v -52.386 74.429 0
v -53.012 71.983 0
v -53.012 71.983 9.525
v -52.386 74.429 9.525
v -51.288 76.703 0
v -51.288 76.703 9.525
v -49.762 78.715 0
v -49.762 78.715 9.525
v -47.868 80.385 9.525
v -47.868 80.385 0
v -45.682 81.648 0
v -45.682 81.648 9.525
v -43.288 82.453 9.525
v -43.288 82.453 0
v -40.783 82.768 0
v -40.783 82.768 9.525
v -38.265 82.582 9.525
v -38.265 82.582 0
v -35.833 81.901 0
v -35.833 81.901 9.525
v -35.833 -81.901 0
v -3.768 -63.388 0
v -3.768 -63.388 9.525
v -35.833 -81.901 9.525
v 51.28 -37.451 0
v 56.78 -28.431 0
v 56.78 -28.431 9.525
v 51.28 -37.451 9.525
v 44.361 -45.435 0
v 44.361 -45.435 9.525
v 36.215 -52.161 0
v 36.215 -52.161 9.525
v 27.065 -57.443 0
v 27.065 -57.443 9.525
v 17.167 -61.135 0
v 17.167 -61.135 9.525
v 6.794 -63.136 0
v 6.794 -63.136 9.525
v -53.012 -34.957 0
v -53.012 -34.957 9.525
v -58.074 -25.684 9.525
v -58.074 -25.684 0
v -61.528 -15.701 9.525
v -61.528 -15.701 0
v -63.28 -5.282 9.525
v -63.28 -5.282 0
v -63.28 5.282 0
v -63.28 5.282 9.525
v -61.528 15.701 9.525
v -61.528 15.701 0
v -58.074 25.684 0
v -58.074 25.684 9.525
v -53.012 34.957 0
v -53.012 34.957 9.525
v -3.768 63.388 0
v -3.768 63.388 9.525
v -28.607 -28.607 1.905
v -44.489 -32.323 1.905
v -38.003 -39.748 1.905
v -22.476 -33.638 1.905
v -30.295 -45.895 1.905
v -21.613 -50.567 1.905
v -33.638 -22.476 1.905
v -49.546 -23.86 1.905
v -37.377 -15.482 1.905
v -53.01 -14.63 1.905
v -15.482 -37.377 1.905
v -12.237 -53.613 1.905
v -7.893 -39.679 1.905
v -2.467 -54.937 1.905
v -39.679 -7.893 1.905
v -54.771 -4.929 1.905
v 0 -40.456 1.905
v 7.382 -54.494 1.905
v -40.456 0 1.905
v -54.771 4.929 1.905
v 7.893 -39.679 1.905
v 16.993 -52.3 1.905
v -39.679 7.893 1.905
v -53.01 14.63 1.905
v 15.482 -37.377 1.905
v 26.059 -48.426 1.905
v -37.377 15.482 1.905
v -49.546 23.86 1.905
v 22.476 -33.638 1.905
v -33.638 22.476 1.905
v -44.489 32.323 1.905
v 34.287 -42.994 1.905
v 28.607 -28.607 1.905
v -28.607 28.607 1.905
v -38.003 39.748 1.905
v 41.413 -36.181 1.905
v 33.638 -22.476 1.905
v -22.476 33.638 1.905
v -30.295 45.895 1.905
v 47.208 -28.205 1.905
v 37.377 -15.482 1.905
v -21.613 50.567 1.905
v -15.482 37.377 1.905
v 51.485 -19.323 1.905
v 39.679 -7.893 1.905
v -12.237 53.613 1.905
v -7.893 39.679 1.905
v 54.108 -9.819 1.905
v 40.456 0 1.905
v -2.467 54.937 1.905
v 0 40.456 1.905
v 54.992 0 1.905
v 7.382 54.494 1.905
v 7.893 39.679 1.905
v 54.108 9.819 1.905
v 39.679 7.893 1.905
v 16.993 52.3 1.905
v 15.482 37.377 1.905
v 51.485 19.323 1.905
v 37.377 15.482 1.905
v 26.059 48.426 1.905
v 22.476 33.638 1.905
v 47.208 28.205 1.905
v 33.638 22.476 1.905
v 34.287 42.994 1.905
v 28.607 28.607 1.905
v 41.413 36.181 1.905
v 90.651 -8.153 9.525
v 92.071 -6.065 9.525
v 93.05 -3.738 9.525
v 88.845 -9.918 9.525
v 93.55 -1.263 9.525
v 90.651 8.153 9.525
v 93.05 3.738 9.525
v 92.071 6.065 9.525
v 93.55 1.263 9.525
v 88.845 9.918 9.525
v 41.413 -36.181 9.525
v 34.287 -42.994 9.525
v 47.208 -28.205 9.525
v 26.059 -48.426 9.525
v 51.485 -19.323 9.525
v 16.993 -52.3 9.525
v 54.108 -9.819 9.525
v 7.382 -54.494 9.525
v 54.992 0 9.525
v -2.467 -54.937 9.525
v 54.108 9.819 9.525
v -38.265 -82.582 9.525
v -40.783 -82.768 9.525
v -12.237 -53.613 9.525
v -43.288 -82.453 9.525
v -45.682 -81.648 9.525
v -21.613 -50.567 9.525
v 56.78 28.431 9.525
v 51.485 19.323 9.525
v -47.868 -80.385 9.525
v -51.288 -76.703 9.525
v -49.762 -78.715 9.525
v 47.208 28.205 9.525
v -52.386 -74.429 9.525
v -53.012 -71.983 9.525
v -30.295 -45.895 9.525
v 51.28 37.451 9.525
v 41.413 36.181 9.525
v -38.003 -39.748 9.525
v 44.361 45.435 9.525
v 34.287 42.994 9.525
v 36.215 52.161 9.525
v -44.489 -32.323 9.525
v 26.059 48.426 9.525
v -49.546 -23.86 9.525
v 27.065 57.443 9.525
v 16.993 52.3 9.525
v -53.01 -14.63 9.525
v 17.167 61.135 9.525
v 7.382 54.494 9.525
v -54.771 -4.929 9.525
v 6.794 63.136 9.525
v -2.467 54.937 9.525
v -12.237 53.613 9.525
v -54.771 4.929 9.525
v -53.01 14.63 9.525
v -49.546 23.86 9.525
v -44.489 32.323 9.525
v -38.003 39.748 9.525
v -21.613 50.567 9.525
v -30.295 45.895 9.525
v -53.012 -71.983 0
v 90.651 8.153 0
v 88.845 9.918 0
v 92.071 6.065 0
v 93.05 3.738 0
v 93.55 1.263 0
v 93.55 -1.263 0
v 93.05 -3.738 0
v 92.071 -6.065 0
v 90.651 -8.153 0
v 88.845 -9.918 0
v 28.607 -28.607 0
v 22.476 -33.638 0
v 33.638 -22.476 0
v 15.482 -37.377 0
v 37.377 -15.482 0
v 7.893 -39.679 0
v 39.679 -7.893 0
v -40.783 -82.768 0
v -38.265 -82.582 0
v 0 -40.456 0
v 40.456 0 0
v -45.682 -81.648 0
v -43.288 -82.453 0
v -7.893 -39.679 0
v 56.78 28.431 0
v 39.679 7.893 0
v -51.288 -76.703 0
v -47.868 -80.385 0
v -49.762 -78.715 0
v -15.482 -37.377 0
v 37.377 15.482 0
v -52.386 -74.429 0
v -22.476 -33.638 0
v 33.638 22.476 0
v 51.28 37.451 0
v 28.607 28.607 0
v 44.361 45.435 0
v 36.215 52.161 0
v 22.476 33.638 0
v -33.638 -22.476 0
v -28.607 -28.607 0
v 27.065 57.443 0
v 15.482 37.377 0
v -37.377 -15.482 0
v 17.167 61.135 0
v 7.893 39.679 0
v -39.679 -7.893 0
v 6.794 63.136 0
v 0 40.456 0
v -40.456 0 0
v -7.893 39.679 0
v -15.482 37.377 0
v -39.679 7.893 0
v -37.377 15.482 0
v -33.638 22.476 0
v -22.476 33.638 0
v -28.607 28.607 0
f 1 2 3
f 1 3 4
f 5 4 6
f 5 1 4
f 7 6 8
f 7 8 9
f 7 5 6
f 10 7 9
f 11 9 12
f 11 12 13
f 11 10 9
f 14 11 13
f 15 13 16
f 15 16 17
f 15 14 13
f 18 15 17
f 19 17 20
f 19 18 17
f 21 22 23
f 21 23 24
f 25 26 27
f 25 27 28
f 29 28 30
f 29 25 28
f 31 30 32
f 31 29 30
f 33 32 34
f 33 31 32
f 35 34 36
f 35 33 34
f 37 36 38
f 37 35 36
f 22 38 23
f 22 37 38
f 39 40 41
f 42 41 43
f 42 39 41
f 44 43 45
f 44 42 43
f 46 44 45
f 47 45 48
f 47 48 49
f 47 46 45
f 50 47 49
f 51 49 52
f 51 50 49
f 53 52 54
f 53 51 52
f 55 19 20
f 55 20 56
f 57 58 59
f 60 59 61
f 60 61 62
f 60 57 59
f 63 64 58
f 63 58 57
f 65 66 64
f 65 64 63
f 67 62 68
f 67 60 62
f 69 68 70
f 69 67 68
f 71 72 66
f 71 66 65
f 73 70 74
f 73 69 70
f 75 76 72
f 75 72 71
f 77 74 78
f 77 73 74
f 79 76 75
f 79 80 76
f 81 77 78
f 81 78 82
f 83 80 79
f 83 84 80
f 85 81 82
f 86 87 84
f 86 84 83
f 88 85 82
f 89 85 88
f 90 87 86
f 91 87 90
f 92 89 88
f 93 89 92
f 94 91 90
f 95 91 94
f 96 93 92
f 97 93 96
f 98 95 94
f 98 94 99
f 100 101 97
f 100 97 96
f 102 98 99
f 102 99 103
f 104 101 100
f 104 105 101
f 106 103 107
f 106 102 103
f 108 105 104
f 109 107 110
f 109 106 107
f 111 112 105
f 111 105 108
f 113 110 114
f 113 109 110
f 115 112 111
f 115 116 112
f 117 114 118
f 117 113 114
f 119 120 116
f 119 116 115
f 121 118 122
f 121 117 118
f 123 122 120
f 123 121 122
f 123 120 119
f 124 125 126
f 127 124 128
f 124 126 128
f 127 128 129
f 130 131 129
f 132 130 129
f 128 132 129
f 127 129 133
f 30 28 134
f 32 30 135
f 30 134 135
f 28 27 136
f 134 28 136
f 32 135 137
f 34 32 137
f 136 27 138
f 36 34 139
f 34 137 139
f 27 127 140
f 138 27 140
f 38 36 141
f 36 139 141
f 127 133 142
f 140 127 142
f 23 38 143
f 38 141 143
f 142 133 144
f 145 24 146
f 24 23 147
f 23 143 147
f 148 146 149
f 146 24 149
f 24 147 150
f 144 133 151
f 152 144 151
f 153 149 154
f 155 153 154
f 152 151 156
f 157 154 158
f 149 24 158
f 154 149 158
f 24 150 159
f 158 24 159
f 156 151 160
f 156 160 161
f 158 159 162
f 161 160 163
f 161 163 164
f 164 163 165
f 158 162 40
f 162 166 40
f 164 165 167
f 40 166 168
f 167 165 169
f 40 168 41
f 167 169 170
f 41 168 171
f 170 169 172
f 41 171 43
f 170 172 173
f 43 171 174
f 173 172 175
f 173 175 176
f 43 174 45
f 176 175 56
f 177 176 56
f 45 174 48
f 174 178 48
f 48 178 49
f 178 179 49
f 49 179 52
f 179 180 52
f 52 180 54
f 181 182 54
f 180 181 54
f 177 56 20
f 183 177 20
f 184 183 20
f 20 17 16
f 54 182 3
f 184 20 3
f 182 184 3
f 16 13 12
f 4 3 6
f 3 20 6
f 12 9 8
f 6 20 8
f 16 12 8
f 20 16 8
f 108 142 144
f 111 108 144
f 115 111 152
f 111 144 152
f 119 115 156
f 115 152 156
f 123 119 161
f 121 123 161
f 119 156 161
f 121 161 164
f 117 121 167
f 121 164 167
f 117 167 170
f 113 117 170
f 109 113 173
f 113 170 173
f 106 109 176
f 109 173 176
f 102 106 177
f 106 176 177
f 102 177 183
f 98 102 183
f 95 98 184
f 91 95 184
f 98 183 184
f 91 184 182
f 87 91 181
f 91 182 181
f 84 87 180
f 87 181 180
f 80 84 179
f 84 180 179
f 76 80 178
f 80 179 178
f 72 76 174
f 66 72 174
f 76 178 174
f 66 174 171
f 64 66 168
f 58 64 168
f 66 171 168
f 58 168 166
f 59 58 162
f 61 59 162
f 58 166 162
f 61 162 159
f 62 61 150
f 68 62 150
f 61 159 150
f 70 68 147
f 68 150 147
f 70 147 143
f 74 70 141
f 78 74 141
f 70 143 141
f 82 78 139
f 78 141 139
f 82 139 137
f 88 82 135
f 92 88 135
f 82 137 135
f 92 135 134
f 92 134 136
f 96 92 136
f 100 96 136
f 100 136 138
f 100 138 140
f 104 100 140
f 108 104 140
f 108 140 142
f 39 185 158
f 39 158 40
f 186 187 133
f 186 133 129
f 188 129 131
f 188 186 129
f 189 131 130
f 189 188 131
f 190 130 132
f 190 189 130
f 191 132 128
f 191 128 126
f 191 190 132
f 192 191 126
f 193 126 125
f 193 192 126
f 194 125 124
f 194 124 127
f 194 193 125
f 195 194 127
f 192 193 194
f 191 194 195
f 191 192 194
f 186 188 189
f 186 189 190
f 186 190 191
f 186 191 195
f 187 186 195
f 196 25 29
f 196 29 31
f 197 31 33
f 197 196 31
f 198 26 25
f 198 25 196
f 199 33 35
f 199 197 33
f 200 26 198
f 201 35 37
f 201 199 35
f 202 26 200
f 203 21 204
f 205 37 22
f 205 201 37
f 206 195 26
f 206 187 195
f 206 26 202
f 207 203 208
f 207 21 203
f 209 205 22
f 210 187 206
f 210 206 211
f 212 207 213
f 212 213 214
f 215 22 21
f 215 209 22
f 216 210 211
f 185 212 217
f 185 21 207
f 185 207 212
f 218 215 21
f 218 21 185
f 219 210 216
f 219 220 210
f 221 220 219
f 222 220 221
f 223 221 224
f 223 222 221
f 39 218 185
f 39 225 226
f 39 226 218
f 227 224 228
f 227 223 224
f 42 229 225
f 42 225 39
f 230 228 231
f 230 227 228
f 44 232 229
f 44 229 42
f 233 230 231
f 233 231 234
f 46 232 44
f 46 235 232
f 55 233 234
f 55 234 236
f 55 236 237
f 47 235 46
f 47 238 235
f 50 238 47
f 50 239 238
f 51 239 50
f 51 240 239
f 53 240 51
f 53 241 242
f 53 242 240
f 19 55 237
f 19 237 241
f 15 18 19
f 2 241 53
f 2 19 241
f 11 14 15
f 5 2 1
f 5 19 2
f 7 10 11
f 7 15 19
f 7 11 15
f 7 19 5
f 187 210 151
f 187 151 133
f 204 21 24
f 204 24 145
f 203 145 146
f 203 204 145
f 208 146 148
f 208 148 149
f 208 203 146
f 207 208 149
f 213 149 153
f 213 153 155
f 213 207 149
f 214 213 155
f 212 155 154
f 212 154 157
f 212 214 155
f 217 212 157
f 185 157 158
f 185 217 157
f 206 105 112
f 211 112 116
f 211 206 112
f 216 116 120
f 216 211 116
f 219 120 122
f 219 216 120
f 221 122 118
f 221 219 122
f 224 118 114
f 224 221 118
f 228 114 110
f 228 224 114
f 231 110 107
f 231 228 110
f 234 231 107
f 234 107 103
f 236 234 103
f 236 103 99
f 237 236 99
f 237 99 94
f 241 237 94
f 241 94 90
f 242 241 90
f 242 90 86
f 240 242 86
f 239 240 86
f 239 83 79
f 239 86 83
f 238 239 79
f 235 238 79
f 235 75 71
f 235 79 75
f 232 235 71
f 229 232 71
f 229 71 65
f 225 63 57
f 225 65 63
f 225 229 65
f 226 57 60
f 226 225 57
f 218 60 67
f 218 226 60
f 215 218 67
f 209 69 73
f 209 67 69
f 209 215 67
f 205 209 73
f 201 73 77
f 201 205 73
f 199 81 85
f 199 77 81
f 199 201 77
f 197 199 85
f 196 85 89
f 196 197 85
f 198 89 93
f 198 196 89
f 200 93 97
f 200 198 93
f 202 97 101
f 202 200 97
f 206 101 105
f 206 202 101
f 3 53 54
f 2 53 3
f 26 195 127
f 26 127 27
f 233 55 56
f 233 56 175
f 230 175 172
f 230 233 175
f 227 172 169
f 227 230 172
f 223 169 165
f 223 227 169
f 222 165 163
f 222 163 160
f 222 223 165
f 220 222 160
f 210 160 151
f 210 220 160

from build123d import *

# Parameters (mm, degrees)
SKETCH1_R          = 40.456394747
BASE_EXTRUDE_DEPTH = 9.525
SKETCH2_R          = 54.991944722
CUT_EXTRUDE1_DEPTH = 7.62


with BuildPart() as part:
    # Sketch1 → Base-Extrude (new body)
    with BuildSketch(Plane.XY):
        with BuildLine():
            Line((88.84522521, -9.917986872), (56.779605871, -28.43108083))
            ThreePointArc((56.779605871, -28.43108083), (31.75, -54.99261314), (-3.76776468, -63.388121516))
            Line((-3.76776468, -63.388121516), (-35.833384019, -81.901215473))
            ThreePointArc((-35.833384019, -81.901215473), (-46.806394747, -81.07105382), (-53.011841191, -71.983228601))
            Line((-53.011841191, -71.983228601), (-53.011841191, -34.957040686))
            ThreePointArc((-53.011841191, -34.957040686), (-63.5, 0), (-53.011841191, 34.957040686))
            Line((-53.011841191, 34.957040686), (-53.011841191, 71.983228601))
            ThreePointArc((-53.011841191, 71.983228601), (-46.806394747, 81.07105382), (-35.833384019, 81.901215473))
            Line((-35.833384019, 81.901215473), (-3.76776468, 63.388121516))
            ThreePointArc((-3.76776468, 63.388121516), (31.75, 54.99261314), (56.779605871, 28.43108083))
            Line((56.779605871, 28.43108083), (88.84522521, 9.917986872))
            ThreePointArc((88.84522521, 9.917986872), (93.612789493, 0), (88.84522521, -9.917986872))
        make_face()
        Circle(SKETCH1_R, mode=Mode.SUBTRACT)
    extrude(amount=BASE_EXTRUDE_DEPTH)

    # Sketch2 → Cut-Extrude1 (cut)
    with BuildSketch(Plane.XY.offset(9.525)):
        Circle(SKETCH2_R)
    extrude(amount=-CUT_EXTRUDE1_DEPTH, mode=Mode.SUBTRACT)


solid = part.part
